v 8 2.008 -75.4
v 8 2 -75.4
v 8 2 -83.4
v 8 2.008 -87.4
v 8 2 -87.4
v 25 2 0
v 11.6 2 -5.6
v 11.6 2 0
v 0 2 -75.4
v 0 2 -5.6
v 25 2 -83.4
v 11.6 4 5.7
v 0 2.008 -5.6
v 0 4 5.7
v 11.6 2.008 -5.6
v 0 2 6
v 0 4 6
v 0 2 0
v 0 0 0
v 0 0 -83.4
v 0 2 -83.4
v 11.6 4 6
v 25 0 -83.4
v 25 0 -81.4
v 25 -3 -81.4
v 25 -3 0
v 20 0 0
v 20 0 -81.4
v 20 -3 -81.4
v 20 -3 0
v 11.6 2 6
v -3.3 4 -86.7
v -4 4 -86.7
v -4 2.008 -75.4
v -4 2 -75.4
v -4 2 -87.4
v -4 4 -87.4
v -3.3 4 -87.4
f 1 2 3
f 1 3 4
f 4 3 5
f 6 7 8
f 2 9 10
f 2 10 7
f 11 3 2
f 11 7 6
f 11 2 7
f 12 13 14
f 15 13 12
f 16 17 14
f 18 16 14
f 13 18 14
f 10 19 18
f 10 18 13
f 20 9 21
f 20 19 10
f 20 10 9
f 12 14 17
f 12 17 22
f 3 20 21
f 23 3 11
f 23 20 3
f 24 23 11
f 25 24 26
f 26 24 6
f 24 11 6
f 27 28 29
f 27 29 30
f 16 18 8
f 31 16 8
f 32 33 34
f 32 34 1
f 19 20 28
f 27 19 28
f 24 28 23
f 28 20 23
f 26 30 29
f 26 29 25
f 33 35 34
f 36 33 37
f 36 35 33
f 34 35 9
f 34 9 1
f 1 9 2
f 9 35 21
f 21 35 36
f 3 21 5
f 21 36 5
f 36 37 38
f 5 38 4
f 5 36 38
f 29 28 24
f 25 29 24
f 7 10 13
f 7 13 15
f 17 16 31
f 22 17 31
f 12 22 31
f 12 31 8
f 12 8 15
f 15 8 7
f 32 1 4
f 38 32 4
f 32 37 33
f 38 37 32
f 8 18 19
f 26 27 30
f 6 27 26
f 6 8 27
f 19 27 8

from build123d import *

# Parameters (mm, degrees)
SKETCH1_W             = 25
SKETCH1_H             = 83.4
BOSS_EXTRUDE1_DEPTH   = 2
SKETCH2_W             = 11.6
SKETCH2_H             = 11.6
SKETCH2_W_2           = 12
SKETCH2_H_2           = 12
BOSS_EXTRUDE2_DEPTH   = 2
CHAMFER1_SIZE         = 11.3
CHAMFER1_SIZE2        = 1.992494882
CHAMFER1_PART_2_SIZE  = 11.3
CHAMFER1_PART_2_SIZE2 = 1.992494882
SKETCH4_W             = 5
SKETCH4_H             = 81.4
BOSS_EXTRUDE3_DEPTH   = 3


with BuildPart() as part:
    # Sketch1 → Boss-Extrude1 (new body)
    with BuildSketch(Plane(origin=(0, 0, 0), x_dir=(1, 0, 0), z_dir=(0, 1, 0))):
        with Locations((12.5, 41.7)):
            Rectangle(SKETCH1_W, SKETCH1_H)
    extrude(amount=BOSS_EXTRUDE1_DEPTH)

    # Sketch2 → Boss-Extrude2 (add)
    with BuildSketch(Plane(origin=(0, 2, 0), x_dir=(1, 0, 0), z_dir=(0, 1, 0))):
        with Locations((5.8, -0.2)):
            Rectangle(SKETCH2_W, SKETCH2_H)
        with Locations((2, 81.4)):
            Rectangle(SKETCH2_W_2, SKETCH2_H_2)
    extrude(amount=BOSS_EXTRUDE2_DEPTH)

    # Chamfer1
    chamfer1_edges = [part.edges().sort_by_distance(p)[0] for p in [
        (5.8, 4, -5.6),
    ]]
    chamfer1_side = [part.faces().sort_by_distance(p)[0] for p in [
        (5.8, 4, 0.2),
    ]]
    chamfer(chamfer1_edges, length=CHAMFER1_SIZE, length2=CHAMFER1_SIZE2, reference=chamfer1_side[0])

    # Chamfer1 part 2
    chamfer1_part_2_edges = [part.edges().sort_by_distance(p)[0] for p in [
        (8, 4, -81.4),
        (2, 4, -75.4),
    ]]
    chamfer1_part_2_side = [part.faces().sort_by_distance(p)[0] for p in [
        (2, 4, -81.4),
    ]]
    chamfer(chamfer1_part_2_edges, length=CHAMFER1_PART_2_SIZE, length2=CHAMFER1_PART_2_SIZE2, reference=chamfer1_part_2_side[0])

    # Sketch4 → Boss-Extrude3 (add)
    with BuildSketch(Plane.XZ):
        with Locations((22.5, -40.7)):
            Rectangle(SKETCH4_W, SKETCH4_H)
    extrude(amount=BOSS_EXTRUDE3_DEPTH)


solid = part.part
